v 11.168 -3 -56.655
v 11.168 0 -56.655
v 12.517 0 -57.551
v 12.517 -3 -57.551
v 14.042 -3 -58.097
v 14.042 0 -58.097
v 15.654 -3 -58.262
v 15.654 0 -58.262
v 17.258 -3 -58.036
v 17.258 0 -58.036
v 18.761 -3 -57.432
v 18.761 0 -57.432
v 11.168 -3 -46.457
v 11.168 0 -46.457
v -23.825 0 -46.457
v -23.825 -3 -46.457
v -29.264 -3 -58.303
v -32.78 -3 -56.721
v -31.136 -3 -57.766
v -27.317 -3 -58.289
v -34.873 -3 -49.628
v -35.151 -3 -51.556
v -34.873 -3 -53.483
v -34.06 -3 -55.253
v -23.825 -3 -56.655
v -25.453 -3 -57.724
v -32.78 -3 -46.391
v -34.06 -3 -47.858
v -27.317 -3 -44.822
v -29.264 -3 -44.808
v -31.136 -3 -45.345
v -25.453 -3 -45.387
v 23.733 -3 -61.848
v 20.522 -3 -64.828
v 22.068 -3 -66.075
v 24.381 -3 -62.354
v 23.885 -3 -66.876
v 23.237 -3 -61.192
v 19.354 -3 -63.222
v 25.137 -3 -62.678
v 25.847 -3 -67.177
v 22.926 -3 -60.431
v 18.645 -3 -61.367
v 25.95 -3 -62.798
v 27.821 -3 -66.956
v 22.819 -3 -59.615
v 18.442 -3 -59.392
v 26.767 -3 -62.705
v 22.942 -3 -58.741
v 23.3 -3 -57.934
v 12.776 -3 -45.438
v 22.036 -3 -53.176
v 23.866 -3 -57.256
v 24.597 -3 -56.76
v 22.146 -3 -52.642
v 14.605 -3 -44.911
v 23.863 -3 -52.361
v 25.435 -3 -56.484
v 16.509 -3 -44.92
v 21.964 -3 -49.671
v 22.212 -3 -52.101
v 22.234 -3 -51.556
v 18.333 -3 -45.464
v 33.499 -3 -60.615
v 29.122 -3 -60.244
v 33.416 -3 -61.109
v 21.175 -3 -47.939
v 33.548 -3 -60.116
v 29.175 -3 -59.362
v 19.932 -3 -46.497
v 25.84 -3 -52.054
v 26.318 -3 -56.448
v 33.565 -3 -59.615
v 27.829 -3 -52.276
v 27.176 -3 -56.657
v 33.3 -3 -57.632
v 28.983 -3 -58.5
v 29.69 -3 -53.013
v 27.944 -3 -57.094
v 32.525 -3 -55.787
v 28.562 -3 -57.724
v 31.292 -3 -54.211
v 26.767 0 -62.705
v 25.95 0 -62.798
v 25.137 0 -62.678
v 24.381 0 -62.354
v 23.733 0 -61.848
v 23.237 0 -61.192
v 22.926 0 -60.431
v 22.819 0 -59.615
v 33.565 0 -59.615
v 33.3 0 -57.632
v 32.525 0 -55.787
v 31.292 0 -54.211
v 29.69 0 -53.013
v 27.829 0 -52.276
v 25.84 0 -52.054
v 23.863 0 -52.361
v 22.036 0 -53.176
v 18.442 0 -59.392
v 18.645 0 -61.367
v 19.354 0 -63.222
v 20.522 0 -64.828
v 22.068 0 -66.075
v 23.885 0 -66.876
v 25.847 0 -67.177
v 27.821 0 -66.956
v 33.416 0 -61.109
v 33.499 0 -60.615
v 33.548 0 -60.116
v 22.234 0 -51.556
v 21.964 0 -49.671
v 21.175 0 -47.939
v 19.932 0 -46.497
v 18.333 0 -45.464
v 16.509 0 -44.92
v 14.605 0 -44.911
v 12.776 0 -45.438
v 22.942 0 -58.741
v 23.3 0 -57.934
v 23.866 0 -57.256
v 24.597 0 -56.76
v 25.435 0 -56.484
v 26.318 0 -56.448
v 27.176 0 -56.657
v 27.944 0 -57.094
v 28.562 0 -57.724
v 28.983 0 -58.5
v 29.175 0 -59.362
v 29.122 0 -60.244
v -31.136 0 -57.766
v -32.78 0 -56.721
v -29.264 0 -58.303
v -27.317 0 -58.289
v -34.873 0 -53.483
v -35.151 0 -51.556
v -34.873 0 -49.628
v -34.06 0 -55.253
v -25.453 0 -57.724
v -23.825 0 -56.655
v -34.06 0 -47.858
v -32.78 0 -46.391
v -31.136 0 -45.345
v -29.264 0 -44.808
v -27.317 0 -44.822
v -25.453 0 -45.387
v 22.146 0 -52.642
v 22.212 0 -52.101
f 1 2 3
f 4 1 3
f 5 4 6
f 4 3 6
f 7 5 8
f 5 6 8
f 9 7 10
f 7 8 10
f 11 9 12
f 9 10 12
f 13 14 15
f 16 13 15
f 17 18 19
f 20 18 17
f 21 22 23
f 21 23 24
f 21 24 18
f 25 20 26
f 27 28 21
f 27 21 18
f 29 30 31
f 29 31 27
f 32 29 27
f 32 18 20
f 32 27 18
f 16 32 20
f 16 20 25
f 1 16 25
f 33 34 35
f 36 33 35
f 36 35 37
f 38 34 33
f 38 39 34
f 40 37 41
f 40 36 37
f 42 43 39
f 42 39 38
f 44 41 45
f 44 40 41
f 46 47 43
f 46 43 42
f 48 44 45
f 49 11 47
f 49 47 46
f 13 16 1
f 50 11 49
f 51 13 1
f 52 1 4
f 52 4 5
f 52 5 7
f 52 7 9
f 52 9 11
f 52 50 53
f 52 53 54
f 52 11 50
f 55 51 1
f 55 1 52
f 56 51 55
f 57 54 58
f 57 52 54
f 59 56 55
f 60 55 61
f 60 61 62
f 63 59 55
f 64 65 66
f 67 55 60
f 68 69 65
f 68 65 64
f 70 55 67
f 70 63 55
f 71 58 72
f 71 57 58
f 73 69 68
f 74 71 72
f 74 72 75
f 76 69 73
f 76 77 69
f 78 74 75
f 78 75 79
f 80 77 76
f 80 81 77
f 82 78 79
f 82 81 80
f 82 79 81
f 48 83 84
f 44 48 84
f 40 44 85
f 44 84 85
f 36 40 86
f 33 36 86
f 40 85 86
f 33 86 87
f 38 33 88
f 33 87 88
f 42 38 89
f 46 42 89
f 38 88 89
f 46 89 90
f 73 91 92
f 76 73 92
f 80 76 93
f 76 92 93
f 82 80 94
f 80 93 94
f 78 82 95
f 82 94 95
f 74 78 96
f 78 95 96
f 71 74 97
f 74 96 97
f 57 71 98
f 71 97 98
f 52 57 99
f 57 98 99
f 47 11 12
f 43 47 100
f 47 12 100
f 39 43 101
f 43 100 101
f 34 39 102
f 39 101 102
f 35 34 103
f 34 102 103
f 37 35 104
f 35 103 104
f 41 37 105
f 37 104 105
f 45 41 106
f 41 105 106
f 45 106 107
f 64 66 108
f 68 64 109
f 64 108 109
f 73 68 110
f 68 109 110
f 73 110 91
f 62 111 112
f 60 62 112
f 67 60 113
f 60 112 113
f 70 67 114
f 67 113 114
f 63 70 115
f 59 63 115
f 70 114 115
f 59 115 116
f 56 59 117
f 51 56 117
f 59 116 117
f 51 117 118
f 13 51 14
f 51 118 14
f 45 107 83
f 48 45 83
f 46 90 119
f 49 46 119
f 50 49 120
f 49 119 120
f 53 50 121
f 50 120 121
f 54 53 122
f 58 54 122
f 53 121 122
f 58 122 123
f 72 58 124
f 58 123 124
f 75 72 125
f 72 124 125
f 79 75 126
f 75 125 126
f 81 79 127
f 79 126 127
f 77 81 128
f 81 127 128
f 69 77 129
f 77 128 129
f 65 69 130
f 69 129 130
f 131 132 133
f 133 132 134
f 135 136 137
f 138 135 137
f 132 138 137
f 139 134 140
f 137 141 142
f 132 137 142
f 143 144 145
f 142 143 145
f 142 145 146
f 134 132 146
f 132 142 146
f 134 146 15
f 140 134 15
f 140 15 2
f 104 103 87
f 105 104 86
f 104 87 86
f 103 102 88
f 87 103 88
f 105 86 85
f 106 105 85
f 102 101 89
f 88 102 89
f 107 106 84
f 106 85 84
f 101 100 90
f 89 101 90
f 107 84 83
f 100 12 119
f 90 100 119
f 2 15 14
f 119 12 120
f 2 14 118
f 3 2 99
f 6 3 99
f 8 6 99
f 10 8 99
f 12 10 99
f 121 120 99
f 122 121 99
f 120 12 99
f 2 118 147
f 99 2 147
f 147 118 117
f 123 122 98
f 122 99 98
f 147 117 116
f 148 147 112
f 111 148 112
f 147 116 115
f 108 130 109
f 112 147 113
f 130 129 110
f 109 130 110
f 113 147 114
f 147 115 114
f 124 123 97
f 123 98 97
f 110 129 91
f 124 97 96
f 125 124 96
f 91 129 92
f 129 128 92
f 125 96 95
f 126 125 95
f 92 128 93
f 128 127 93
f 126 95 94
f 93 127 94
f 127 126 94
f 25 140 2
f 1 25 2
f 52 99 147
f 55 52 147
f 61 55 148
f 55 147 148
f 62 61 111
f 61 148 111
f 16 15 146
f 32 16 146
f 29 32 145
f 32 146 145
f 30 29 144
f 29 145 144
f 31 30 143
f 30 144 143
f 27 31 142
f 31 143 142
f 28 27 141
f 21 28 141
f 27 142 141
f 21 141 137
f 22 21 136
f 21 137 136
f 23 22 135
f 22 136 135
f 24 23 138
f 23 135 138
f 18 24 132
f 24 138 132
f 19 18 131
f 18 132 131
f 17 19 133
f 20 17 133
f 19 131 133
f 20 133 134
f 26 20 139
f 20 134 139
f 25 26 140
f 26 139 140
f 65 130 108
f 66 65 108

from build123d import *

# Parameters (mm, degrees)
F1_DEPTH = 3
F3_DEPTH = 25


# Not quite as in the source:
# - a feature names something its author has since deleted; it is built from what else it names


with BuildPart() as f1:
    # F0 (on Front) → F1 (new body)
    with BuildSketch(Plane.XZ):
        with BuildLine():
            Line((-24.6447846293, -46.4568324387), (-24.6447846293, -56.6546805203))
            Line((-24.6447846293, -56.6546805203), (-23.8253123528, -56.6546805203))
            ThreePointArc((-23.8253123528, -56.6546805203), (-22.130084006, -54.3516793641), (-21.5297268649, -51.5557564795))
            ThreePointArc((-21.5297268649, -51.5557564795), (-22.130084006, -48.7598335949), (-23.8253123528, -46.4568324387))
            Line((-23.8253123528, -46.4568324387), (-24.6447846293, -46.4568324387))
        make_face()
        with BuildLine():
            Line((-23.8253123528, -56.6546805203), (-24.6447846293, -56.6546805203))
            Line((-24.6447846293, -56.6546805203), (-24.6447846293, -46.4568324387))
            Line((-24.6447846293, -46.4568324387), (-23.8253123528, -46.4568324387))
            ThreePointArc((-23.8253123528, -46.4568324387), (-35.1509748081, -51.5557564795), (-23.8253123528, -56.6546805203))
        make_face()
        with BuildLine():
            ThreePointArc((-21.5297268649, -51.5557564795), (-22.130084006, -54.3516793641), (-23.8253123528, -56.6546805203))
            Line((-23.8253123528, -56.6546805203), (11.1679025889, -56.6546805203))
            ThreePointArc((11.1679025889, -56.6546805203), (8.8185102803, -51.5557564795), (11.1679025889, -46.4568324387))
            Line((11.1679025889, -46.4568324387), (-23.8253123528, -46.4568324387))
            ThreePointArc((-23.8253123528, -46.4568324387), (-22.130084006, -48.7598335949), (-21.5297268649, -51.5557564795))
        make_face()
        with BuildLine():
            ThreePointArc((11.1679025889, -46.4568324387), (8.8185102803, -51.5557564795), (11.1679025889, -56.6546805203))
            Line((11.1679025889, -56.6546805203), (11.8974819779, -56.6546805203))
            Line((11.8974819779, -56.6546805203), (11.8974819779, -46.4568324387))
            Line((11.8974819779, -46.4568324387), (11.1679025889, -46.4568324387))
        make_face()
        with BuildLine():
            Line((11.8974819779, -56.6546805203), (11.1679025889, -56.6546805203))
            ThreePointArc((11.1679025889, -56.6546805203), (14.8431416467, -58.2287078356), (18.7610955863, -57.4321018799))
            ThreePointArc((18.7610955863, -57.4321018799), (20.0078661899, -55.0037023767), (22.0355331957, -53.1761007794))
            ThreePointArc((22.0355331957, -53.1761007794), (22.1843328788, -52.371994204), (22.234179719, -51.5557564795))
            ThreePointArc((22.234179719, -51.5557564795), (18.3334195709, -45.4635172382), (11.1679025889, -46.4568324387))
            Line((11.1679025889, -46.4568324387), (11.8974819779, -46.4568324387))
            Line((11.8974819779, -46.4568324387), (11.8974819779, -56.6546805203))
        make_face()
        with BuildLine():
            ThreePointArc((22.0355331957, -53.1761007794), (20.0078661899, -55.0037023767), (18.7610955863, -57.4321018799))
            ThreePointArc((18.7610955863, -57.4321018799), (20.8427791516, -55.6460589781), (22.0355331957, -53.1761007794))
        make_face()
        with BuildLine():
            ThreePointArc((22.0355331957, -53.1761007794), (20.8427791516, -55.6460589781), (18.7610955863, -57.4321018799))
            ThreePointArc((18.7610955863, -57.4321018799), (24.8985692809, -67.0974714468), (33.5650116518, -59.615444392))
            ThreePointArc((33.5650116518, -59.615444392), (29.6898526428, -53.0125279979), (22.0355331957, -53.1761007794))
        make_face()
    extrude(amount=F1_DEPTH)

    # F2 (on face) → F3 (cut)
    with BuildSketch(Plane(origin=(0, 0, 0), x_dir=(-1, 0, 0), z_dir=(0, 1, 0))):
        with BuildLine():
            ThreePointArc((-26.7674391798, -62.7047392847), (-28.3016132323, -61.8158013566), (-29.1220744495, -60.2439412946))
            Line((-29.1220744495, -60.2439412946), (-33.4160842435, -61.108925342))
            ThreePointArc((-33.4160842435, -61.108925342), (-31.4664434529, -64.8440957921), (-27.8208252933, -66.9564560213))
            Line((-27.8208252933, -66.9564560213), (-26.7674391798, -62.7047392847))
        make_face()
        with BuildLine():
            ThreePointArc((-27.8208252933, -66.9564560213), (-31.4664434529, -64.8440957921), (-33.4160842435, -61.108925342))
            Line((-33.4160842435, -61.108925342), (-39.6901629865, -62.3727738857))
            Line((-39.6901629865, -62.3727738857), (-29.0901046246, -72.0795691013))
            Line((-29.0901046246, -72.0795691013), (-27.8208252933, -66.9564560213))
        make_face()
        with BuildLine():
            Line((-26.0020494461, -59.615444392), (-29.1220744495, -60.2439412946))
            ThreePointArc((-29.1220744495, -60.2439412946), (-28.3016132323, -61.8158013566), (-26.7674391798, -62.7047392847))
            Line((-26.7674391798, -62.7047392847), (-26.0020494461, -59.615444392))
        make_face()
        with BuildLine():
            ThreePointArc((-26.7674391798, -62.7047392847), (-24.0407284287, -62.1219926651), (-22.8193517887, -59.615444392))
            ThreePointArc((-22.8193517887, -59.615444392), (-26.3178564355, -56.4484536556), (-29.1220744495, -60.2439412946))
            Line((-29.1220744495, -60.2439412946), (-26.0020494461, -59.615444392))
            Line((-26.0020494461, -59.615444392), (-26.7674391798, -62.7047392847))
        make_face()
    extrude(amount=-F3_DEPTH, mode=Mode.SUBTRACT)


solid = f1.part
